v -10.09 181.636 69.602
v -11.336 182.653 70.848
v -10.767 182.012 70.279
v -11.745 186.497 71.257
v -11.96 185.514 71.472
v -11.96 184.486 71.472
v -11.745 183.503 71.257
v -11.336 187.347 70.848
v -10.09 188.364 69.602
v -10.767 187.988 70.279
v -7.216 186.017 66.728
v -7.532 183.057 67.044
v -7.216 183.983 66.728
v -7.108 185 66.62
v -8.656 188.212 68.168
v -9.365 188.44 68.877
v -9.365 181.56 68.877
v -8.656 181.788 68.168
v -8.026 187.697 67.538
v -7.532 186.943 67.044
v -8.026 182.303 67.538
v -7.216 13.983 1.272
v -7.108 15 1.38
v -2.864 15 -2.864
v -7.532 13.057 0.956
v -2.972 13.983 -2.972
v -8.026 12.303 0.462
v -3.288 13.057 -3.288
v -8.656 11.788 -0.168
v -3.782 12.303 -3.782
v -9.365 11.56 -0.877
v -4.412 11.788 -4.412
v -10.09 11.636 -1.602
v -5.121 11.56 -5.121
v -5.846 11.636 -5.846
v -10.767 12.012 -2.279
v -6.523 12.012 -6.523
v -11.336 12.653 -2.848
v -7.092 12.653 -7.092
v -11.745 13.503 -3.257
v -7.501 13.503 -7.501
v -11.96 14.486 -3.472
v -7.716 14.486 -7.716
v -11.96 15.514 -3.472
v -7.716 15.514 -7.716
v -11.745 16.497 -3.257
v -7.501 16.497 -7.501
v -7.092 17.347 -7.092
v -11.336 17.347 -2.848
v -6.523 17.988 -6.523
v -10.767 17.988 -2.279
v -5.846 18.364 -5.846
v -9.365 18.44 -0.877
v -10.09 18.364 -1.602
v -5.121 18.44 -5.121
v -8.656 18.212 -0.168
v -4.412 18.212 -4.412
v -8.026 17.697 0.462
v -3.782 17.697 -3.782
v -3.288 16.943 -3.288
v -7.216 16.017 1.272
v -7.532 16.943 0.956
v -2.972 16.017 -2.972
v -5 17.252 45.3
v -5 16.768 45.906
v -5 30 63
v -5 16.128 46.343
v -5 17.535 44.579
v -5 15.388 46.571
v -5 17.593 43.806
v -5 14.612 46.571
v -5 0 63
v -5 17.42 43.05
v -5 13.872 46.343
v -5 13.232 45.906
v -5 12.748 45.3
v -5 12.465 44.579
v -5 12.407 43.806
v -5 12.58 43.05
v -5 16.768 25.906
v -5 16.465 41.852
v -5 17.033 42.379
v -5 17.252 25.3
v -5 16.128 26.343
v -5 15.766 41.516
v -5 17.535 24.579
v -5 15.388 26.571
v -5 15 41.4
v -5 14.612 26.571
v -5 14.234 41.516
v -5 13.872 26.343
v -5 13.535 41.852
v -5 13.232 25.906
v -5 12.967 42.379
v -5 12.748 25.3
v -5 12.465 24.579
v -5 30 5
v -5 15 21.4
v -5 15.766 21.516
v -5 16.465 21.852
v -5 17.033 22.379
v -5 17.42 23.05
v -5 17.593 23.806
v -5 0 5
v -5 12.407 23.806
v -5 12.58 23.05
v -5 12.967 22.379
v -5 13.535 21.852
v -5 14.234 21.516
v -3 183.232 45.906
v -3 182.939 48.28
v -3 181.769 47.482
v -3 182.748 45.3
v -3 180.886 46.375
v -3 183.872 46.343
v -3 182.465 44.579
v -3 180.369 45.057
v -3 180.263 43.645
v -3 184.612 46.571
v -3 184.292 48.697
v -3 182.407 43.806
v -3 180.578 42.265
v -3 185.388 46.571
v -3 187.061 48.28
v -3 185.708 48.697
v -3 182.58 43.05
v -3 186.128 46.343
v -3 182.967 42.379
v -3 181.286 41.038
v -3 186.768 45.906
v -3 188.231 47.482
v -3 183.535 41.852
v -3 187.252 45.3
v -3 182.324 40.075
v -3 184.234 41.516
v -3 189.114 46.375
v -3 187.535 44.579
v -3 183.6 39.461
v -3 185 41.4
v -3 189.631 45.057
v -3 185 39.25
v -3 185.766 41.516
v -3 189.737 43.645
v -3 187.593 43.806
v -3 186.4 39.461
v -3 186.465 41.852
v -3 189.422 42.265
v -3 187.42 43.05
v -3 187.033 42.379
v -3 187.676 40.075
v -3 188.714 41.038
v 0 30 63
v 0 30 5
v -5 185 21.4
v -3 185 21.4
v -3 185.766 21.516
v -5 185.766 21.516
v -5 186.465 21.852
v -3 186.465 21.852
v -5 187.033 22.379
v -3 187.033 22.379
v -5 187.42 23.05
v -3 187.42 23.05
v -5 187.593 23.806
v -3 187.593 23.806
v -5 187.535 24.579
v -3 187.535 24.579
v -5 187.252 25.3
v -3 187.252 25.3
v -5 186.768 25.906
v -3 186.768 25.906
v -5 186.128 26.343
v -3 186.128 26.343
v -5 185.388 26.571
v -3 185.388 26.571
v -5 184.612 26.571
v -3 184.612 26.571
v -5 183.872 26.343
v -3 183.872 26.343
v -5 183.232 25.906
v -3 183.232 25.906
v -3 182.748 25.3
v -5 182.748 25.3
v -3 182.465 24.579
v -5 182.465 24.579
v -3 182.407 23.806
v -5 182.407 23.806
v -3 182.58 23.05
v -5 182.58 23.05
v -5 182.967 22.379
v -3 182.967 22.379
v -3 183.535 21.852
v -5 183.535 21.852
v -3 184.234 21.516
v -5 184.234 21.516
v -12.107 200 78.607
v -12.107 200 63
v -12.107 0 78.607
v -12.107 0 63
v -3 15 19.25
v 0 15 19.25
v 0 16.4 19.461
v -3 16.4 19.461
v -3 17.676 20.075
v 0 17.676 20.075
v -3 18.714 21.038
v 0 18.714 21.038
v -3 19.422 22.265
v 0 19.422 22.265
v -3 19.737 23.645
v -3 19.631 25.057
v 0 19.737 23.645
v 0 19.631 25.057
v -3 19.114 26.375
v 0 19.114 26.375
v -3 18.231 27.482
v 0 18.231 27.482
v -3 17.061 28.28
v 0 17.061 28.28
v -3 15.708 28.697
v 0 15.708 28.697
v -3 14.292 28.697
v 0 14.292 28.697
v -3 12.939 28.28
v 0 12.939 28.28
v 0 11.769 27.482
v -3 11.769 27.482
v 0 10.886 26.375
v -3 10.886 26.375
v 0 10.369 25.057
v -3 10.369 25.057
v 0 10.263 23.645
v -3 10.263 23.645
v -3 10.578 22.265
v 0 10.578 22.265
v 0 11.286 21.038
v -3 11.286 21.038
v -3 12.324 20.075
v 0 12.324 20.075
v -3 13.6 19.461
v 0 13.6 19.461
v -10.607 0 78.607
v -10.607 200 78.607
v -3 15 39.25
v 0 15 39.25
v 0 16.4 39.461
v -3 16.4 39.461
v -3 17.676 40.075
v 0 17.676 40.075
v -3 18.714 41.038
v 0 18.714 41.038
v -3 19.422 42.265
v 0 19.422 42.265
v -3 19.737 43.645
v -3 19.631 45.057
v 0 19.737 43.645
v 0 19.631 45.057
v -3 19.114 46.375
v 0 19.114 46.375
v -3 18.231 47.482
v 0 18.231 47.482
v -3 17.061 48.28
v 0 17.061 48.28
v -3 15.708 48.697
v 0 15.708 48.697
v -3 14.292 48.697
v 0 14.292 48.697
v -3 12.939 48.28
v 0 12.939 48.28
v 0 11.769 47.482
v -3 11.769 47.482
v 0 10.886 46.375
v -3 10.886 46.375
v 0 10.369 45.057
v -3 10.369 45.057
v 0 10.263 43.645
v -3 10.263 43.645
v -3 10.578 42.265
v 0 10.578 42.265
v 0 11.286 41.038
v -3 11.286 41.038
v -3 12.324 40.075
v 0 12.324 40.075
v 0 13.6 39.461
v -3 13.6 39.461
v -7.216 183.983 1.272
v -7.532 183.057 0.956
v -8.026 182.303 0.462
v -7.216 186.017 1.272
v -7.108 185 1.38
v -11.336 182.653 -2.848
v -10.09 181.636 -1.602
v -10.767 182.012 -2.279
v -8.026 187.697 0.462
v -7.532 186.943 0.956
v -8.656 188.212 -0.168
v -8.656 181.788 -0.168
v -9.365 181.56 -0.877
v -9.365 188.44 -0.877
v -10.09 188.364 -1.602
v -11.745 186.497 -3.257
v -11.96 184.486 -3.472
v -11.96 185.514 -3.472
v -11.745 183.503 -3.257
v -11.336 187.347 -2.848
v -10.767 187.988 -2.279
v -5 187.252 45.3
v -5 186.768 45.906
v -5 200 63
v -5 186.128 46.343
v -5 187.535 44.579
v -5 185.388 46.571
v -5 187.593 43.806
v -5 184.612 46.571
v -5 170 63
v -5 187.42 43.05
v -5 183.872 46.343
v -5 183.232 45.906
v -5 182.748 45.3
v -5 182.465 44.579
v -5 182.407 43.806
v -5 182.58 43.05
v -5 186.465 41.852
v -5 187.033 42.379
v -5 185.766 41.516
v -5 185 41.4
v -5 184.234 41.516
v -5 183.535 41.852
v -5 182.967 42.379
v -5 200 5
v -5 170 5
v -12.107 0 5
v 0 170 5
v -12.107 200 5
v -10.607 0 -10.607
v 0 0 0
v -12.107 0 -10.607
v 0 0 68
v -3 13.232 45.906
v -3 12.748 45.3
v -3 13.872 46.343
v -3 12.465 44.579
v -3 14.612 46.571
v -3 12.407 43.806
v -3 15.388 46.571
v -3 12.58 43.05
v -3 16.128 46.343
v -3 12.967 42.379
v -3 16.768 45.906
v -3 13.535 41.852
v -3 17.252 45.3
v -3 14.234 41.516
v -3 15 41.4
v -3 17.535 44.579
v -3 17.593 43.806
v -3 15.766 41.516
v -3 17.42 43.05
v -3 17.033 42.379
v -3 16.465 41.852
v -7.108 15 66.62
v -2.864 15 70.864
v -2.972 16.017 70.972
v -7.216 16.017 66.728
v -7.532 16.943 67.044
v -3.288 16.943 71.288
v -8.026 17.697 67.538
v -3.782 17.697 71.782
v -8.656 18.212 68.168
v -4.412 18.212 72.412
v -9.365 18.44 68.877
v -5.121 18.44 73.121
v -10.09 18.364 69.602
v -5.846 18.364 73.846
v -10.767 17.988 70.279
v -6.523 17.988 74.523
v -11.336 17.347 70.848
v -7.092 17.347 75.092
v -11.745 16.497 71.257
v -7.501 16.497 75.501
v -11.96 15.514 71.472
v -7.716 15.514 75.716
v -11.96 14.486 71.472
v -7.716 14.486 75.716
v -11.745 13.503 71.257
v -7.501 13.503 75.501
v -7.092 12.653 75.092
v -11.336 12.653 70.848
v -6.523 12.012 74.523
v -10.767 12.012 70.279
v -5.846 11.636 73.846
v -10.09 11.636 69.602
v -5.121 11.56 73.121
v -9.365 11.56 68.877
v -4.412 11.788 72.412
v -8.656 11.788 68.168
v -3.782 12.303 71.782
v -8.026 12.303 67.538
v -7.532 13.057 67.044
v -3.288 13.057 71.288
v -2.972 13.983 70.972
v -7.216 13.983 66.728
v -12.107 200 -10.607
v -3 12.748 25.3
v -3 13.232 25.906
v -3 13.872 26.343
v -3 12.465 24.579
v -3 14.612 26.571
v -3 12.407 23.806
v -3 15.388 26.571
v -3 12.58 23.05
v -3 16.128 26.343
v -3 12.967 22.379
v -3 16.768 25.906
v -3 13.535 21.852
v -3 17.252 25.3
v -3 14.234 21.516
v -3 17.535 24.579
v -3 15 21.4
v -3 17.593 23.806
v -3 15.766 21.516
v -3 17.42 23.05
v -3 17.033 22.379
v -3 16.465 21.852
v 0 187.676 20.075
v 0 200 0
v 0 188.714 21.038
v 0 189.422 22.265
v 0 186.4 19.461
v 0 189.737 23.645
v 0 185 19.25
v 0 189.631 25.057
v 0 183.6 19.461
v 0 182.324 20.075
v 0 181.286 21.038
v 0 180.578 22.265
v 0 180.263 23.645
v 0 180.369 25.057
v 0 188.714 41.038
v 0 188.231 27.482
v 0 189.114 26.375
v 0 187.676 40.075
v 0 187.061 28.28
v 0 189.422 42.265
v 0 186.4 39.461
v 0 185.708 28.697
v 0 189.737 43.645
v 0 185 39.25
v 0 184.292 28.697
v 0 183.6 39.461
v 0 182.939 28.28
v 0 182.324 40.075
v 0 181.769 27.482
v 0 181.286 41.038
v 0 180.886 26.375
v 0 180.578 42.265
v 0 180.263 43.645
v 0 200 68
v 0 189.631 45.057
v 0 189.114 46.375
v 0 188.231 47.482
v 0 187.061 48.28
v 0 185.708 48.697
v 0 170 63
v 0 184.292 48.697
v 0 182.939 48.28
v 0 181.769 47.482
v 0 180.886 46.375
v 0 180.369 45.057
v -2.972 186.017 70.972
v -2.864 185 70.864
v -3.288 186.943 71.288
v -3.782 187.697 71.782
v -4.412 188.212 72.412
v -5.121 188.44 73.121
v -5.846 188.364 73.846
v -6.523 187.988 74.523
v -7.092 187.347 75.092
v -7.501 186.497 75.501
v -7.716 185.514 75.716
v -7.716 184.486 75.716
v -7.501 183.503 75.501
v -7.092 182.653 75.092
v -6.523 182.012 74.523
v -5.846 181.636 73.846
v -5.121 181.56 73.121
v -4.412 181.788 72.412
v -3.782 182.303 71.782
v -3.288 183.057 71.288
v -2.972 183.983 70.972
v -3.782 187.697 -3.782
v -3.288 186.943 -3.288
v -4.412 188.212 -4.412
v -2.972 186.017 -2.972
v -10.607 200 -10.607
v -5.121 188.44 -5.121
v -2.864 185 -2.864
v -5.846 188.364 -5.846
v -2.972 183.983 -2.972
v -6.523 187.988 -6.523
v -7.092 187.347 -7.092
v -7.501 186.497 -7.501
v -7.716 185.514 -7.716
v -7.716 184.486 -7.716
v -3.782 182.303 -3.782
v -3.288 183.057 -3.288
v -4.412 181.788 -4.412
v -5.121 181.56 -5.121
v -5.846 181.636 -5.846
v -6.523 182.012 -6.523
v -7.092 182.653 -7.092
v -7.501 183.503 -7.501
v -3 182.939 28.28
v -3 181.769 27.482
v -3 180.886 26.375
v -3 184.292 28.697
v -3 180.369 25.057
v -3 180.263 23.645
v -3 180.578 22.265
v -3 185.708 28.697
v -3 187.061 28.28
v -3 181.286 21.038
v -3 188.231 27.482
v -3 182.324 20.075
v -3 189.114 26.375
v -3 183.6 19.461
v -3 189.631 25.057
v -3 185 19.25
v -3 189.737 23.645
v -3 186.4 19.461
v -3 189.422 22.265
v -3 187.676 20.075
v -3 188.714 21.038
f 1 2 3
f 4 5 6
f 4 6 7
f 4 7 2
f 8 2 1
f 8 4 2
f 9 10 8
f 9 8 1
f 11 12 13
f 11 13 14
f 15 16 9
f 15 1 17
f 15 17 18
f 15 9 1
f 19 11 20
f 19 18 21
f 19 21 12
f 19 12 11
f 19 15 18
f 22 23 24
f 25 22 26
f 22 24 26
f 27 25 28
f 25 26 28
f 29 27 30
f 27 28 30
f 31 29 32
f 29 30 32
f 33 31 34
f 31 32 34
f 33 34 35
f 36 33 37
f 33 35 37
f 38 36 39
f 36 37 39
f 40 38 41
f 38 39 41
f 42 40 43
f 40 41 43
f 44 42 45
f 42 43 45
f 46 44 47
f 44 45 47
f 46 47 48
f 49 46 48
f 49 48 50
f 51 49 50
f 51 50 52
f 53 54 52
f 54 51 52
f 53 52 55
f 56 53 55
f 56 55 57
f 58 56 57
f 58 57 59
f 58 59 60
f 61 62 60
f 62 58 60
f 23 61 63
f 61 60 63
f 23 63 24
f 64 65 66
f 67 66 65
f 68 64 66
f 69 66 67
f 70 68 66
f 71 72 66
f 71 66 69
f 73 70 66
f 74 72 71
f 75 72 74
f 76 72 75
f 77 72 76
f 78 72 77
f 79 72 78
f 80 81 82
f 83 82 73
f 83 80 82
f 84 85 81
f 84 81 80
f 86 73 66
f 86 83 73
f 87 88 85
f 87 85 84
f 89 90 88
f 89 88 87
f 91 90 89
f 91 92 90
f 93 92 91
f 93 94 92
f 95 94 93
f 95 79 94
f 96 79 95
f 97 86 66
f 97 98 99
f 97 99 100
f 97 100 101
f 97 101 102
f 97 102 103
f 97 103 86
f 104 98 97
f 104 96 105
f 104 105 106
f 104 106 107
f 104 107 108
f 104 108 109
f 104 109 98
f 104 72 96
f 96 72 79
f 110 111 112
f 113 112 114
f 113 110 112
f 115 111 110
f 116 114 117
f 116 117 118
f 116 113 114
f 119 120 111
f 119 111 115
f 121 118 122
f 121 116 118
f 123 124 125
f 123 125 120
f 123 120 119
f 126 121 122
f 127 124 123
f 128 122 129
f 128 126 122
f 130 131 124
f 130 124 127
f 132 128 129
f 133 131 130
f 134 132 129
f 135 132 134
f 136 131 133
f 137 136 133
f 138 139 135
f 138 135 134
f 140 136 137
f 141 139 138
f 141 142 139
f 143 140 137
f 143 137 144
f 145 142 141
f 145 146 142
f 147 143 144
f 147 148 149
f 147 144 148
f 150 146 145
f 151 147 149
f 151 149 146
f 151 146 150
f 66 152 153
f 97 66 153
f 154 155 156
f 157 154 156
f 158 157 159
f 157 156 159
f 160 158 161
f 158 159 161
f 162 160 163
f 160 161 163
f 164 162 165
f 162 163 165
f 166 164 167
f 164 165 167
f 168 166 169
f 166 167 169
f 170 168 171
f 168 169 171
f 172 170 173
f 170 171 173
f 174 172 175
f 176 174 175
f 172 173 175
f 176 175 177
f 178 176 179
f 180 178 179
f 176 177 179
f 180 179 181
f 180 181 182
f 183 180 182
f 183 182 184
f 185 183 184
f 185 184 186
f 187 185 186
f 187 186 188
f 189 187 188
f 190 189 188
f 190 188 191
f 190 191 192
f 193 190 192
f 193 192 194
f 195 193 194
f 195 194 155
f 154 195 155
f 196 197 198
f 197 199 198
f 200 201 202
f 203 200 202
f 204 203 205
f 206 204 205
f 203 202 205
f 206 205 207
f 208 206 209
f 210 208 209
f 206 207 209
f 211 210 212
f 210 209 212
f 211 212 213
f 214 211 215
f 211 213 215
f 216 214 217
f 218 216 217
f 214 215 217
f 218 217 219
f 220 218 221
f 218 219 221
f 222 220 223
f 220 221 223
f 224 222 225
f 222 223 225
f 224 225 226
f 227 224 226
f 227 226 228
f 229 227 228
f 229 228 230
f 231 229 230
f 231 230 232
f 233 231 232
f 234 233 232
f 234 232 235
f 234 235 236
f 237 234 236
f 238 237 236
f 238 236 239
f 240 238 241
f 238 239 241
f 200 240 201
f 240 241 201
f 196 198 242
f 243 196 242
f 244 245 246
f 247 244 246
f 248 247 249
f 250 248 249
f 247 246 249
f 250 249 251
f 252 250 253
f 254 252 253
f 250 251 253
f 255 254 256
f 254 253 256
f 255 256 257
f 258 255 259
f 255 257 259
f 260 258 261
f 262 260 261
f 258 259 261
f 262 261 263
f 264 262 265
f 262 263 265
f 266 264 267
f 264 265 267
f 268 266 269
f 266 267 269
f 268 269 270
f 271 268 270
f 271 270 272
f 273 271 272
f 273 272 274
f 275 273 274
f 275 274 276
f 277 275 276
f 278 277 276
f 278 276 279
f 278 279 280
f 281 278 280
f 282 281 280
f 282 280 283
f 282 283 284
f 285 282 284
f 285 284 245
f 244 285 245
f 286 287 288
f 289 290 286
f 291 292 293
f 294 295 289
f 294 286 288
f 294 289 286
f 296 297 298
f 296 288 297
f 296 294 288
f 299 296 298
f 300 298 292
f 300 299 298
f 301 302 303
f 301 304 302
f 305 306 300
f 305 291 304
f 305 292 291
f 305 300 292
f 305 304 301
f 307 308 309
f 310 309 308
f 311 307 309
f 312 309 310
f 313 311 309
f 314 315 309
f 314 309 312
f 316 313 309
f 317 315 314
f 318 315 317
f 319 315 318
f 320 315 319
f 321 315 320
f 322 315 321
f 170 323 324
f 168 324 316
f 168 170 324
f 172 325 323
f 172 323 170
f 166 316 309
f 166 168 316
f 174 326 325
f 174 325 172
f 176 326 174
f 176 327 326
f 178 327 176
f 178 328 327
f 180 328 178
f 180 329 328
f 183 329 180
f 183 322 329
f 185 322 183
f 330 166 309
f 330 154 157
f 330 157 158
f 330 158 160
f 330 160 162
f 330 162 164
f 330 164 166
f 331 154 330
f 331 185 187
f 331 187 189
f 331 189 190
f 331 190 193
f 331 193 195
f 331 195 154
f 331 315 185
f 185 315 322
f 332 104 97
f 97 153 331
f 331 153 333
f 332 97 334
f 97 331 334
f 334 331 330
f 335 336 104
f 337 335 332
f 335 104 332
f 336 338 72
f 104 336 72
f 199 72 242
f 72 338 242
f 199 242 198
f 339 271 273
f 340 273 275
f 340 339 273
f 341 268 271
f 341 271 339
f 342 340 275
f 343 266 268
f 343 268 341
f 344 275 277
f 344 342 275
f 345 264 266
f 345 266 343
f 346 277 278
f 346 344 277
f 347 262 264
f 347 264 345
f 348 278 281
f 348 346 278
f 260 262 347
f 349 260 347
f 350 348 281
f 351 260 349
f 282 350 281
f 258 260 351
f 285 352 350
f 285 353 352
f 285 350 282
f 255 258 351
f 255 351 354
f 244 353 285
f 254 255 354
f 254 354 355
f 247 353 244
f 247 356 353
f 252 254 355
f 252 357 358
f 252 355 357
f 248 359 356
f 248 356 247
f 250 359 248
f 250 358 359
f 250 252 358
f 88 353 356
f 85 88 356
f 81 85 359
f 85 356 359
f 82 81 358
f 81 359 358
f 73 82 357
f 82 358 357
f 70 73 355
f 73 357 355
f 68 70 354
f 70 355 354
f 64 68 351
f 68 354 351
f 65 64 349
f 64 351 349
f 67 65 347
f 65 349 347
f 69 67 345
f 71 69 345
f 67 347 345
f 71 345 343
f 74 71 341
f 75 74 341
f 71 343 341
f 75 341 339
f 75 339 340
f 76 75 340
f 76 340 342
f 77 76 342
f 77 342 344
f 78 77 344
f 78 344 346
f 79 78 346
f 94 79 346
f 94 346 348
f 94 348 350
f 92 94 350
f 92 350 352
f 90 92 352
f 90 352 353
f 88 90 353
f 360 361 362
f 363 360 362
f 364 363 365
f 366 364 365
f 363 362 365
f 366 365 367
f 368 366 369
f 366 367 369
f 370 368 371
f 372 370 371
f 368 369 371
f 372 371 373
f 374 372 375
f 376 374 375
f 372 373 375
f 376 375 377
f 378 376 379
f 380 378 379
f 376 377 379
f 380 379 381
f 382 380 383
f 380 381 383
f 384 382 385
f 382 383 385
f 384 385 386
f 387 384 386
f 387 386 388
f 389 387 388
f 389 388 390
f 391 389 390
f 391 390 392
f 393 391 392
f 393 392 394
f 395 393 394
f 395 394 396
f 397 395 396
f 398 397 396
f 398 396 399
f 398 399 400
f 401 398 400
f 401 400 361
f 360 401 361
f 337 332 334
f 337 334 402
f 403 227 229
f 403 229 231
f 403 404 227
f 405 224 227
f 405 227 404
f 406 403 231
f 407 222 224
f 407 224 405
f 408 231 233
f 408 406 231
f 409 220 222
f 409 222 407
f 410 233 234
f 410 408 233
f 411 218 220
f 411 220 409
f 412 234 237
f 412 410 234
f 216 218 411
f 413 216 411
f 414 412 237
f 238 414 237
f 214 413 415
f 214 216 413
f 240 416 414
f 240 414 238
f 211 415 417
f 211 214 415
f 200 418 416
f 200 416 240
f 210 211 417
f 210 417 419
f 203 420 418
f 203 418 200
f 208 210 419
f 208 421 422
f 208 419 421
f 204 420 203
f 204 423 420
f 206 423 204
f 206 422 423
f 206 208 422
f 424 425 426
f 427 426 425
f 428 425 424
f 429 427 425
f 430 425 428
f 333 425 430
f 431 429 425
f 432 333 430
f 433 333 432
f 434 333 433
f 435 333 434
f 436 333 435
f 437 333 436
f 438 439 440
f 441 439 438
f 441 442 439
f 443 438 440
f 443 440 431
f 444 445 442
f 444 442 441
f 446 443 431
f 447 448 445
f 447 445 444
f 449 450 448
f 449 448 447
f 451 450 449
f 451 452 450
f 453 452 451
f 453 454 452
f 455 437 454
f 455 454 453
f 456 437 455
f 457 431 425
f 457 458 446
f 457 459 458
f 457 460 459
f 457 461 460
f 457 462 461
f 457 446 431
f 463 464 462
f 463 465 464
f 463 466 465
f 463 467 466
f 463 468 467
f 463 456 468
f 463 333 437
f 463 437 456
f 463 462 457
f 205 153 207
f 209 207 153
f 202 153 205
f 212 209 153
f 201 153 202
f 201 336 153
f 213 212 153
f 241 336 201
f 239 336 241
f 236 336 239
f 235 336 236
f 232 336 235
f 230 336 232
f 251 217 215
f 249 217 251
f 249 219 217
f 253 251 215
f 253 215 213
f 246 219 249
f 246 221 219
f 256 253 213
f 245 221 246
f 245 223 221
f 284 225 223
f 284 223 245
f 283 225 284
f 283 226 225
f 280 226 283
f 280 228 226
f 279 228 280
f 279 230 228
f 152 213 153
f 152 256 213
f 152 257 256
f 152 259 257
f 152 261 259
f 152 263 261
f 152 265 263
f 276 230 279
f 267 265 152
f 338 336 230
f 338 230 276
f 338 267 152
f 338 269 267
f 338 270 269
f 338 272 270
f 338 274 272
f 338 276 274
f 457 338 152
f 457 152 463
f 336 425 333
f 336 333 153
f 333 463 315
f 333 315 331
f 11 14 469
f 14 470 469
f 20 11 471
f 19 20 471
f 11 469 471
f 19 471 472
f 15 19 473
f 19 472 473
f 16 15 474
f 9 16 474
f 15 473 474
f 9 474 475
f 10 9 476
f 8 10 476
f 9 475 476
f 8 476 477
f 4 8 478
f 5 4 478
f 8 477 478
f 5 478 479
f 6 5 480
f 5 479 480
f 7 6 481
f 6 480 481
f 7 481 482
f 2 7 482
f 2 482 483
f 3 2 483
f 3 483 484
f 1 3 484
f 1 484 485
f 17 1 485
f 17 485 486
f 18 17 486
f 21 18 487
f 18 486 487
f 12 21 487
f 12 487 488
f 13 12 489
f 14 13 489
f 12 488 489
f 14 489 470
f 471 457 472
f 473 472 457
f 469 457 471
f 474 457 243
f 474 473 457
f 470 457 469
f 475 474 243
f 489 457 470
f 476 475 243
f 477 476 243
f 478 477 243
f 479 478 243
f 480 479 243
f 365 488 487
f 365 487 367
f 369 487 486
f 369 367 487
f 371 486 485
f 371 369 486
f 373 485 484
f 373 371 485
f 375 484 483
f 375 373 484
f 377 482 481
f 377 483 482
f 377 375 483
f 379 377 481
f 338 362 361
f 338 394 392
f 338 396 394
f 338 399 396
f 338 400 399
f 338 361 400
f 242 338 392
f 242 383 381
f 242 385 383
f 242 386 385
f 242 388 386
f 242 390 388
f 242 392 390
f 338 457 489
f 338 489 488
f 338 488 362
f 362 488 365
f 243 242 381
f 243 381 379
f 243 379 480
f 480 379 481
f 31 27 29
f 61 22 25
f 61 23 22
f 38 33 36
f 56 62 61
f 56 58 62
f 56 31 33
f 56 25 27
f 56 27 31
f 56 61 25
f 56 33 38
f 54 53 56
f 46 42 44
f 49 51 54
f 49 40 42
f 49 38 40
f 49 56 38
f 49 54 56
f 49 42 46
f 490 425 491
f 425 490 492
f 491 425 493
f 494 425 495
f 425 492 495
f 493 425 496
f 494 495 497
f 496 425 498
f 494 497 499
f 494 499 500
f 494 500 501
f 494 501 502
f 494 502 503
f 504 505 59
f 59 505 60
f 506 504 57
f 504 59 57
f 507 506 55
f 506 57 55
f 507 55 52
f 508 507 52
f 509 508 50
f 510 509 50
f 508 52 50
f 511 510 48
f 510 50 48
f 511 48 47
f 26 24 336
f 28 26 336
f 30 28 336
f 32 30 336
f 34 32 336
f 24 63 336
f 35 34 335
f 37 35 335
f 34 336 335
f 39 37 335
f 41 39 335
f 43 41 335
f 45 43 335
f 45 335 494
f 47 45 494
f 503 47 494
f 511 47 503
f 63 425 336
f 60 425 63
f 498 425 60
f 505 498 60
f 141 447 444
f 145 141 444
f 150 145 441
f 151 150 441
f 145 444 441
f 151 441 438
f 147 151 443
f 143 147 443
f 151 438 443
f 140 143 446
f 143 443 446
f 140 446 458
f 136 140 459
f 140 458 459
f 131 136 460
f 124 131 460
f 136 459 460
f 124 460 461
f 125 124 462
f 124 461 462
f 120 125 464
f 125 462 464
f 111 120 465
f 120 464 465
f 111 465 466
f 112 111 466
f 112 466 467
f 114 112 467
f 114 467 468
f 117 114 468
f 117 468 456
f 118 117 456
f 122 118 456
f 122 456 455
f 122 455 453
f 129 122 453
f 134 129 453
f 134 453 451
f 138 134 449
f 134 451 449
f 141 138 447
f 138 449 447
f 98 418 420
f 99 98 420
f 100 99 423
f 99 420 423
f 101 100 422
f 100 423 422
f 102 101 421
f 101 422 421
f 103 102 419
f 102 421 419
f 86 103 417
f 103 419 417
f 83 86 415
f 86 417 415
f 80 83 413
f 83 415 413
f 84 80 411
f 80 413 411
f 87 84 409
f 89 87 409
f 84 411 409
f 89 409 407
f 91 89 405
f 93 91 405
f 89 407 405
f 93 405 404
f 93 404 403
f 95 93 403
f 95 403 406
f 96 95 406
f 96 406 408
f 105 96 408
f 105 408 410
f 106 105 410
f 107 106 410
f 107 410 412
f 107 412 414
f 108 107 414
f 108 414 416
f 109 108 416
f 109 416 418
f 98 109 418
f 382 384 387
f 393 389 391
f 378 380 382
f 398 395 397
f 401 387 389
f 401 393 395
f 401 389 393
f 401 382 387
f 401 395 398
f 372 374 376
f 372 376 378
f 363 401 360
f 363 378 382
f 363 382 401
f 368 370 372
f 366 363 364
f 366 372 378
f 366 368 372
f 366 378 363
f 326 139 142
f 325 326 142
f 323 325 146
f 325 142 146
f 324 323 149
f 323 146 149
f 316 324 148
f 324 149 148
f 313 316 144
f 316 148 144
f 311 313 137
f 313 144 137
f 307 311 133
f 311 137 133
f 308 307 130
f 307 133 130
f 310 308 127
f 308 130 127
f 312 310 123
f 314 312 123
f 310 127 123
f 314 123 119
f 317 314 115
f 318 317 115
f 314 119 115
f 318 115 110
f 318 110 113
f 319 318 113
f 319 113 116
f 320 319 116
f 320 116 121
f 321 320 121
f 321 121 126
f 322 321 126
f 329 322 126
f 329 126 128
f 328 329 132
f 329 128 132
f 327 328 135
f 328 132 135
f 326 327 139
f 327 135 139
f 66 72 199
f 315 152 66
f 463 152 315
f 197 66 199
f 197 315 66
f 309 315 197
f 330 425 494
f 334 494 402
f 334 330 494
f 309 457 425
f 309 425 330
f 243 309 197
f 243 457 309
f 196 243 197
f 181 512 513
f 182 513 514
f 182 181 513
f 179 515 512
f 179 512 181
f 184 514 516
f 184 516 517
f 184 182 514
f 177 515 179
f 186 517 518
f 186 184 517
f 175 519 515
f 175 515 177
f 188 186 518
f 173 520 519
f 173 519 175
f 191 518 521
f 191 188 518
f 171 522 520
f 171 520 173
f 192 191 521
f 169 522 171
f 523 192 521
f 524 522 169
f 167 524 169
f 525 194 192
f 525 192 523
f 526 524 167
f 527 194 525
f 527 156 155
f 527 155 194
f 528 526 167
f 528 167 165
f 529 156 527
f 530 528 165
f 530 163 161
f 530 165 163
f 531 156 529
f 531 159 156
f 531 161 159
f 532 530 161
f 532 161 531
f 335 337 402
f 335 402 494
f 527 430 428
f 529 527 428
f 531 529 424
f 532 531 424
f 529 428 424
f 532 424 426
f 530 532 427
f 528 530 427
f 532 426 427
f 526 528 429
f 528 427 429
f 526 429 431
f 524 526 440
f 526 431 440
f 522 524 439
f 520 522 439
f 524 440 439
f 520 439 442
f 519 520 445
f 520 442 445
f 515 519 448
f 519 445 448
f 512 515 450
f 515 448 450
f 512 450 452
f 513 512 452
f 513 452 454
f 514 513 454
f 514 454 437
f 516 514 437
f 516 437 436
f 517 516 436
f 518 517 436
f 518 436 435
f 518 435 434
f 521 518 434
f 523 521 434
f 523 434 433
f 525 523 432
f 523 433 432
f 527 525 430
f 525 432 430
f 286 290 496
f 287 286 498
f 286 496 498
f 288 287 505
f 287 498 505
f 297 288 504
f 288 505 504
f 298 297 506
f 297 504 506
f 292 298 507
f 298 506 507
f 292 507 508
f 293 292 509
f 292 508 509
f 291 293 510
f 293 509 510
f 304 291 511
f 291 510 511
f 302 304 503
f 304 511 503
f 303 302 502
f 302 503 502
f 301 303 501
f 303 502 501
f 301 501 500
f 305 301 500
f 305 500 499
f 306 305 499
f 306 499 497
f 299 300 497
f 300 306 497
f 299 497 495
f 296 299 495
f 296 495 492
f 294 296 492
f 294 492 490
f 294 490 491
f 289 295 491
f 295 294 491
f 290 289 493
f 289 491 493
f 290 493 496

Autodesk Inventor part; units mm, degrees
ref_plane "YZ Plane" through (0, 0, 0) normal (1, 0, 0) x (0, 1, 0)
ref_plane "XZ Plane" through (0, 0, 0) normal (0, 1, 0) x (-1, 0, 0)
sketch "Sketch1" plane through (0, 0, 0) normal (0, 1, 0) x (-1, 0, 0)
  line L0 (0, 0) -> (0, 68)
  line L1 (0, 0) -> (10.6066, -10.6066)
  line L2 (0, 68) -> (10.6066, 78.6066)
  line L3 (5, 63) -> (5, 5)
  line L4 (10.6066, 78.6066) -> (10.6066, 63)
  line L5 (10.6066, -10.6066) -> (10.6066, 5)
  line L6 (10.6066, 63) -> (5, 63)
  line L7 (10.6066, 5) -> (5, 5)
  line L8 (10.6066, 5) -> (12.1066, 5)
  line L9 (12.1066, 5) -> (12.1066, -10.6066)
  line L10 (12.1066, -10.6066) -> (10.6066, -10.6066)
  line L11 (10.6066, -10.6066) -> (10.6066, 5)
  line L12 (10.6066, 63) -> (12.1066, 63)
  line L13 (12.1066, 63) -> (12.1066, 78.6066)
  line L14 (12.1066, 78.6066) -> (10.6066, 78.6066)
  line L15 (10.6066, 78.6066) -> (10.6066, 63)
  dimension "d0" = 68
  dimension "d1" = 15
  dimension "d2" = 135
  dimension "d4" = 15
  dimension "d5" = 135
  dimension "d6" = 5
  dimension "d7" = 5
  dimension "d8" = 5
  dimension "d35" = 1.5
extrude "Extrusion1" add sketch "Sketch1" along normal blind 200
sketch "Sketch2" plane through (0, 0, 68) normal (0.7071, 0, 0.7071) x (0.7071, 0, -0.7071)
  line L0 (-15, 0) -> (0, 0) construction
  line L1 (-7.5, 0) -> (-7.5, 200) construction
  circle A0 centre (-7.5, 185) radius 3.45
  circle A1 centre (-7.5, 15) radius 3.45
  line L2 (-15, 200) -> (0, 200) projected
  point P0 (48.0833, 0)
  dimension "d11" = 6.9
  dimension "d12" = 6.9
  dimension "d13" = 15
  dimension "d14" = 15
extrude "Extrusion2" cut sketch "Sketch2" against normal blind 6
sketch "Sketch3" plane through (0, 0, 68) normal (1, 0, 0) x (0, 0, -1)
  ellipse E0 centre (-5.3033, 185) end of major axis (-5.3033, 181.55) minor radius 2.4395 construction
  ellipse E1 centre (73.3033, 185) end of major axis (73.3033, 188.45) minor radius 2.4395 construction
  line L0 (-5.3033, 185) -> (73.3033, 185) construction
  ellipse E2 centre (-5.3033, 15) end of major axis (-5.3033, 11.55) minor radius 2.4395 construction
  ellipse E3 centre (73.3033, 15) end of major axis (73.3033, 18.45) minor radius 2.4395 construction
  line L1 (-5.3033, 15) -> (73.3033, 15) construction
  line L2 (0, 200) -> (68, 200) construction
  line L3 (34, 200) -> (34, 0) construction
  line L4 (63, 0) -> (5, 0) construction
  line L5 (44, 200) -> (44, 0) construction
  line L6 (24, 200) -> (24, 0) construction
  circle A0 centre (44, 185) radius 2.6
  circle A1 centre (24, 185) radius 2.6
  circle A2 centre (24, 15) radius 2.6
  circle A3 centre (44, 15) radius 2.6
  point P0 (68, 0)
  dimension "d17" = 10
  dimension "d18" = 10
  dimension "d19" = 5.2
  dimension "d20" = 5.2
  dimension "d21" = 5.2
  dimension "d22" = 5.2
extrude "Extrusion3" cut sketch "Sketch3" against normal up to next
sketch "Sketch4" plane through (0, 0, 68) normal (1, 0, 0) x (0, 0, -1)
  line L0 (5, 0) -> (5, 200) projected
  line L1 (63, 0) -> (63, 200) projected
  line L2 (5, 170) -> (63, 170)
  line L3 (5, 30) -> (63, 30)
  circle A0 centre (24, 185) radius 2.6 projected
  circle A1 centre (24, 15) radius 2.6 projected
  point P0 (68, 0)
  dimension "d25" = 15
  dimension "d26" = 15
extrude "Extrusion4" cut sketch "Sketch4" against normal up to next contours L0 L2 L1 L3
sketch "Sketch5" plane through (0, 0, 68) normal (1, 0, 0) x (0, 0, -1)
  circle A0 centre (24, 185) radius 2.6 projected
  circle A1 centre (24, 185) radius 4.75
  circle A2 centre (44, 185) radius 2.6 projected
  circle A3 centre (44, 185) radius 4.75
  circle A4 centre (24, 15) radius 2.6 projected
  circle A5 centre (24, 15) radius 4.75
  circle A6 centre (44, 15) radius 2.6 projected
  circle A7 centre (44, 15) radius 4.75
  point P0 (68, 0)
  dimension "d29" = 9.5
  dimension "d30" = 9.5
  dimension "d31" = 9.5
  dimension "d32" = 9.5
extrude "Extrusion5" cut sketch "Sketch5" against normal blind 3
ref_plane "Work Plane2" through (-12.1066, 0, 34) normal (0, 0, 1) x (1, 0, 0)
mirror "Mirror2" about plane through (-12.1066, 0, 34) normal (0, 0, 1) of "Extrusion2"
equation "\"d4\" = d1"
equation "\"d5\" = d2"
equation "\"d12\" = d11"
equation "\"d14\" = d13"
equation "\"d20\" = d19"
equation "\"d21\" = d19"
equation "\"d22\" = d19"
equation "\"d30\" = d29"
equation "\"d31\" = d29"
equation "\"d32\" = d29"
properties part number "Z Axis Cover Frame"
